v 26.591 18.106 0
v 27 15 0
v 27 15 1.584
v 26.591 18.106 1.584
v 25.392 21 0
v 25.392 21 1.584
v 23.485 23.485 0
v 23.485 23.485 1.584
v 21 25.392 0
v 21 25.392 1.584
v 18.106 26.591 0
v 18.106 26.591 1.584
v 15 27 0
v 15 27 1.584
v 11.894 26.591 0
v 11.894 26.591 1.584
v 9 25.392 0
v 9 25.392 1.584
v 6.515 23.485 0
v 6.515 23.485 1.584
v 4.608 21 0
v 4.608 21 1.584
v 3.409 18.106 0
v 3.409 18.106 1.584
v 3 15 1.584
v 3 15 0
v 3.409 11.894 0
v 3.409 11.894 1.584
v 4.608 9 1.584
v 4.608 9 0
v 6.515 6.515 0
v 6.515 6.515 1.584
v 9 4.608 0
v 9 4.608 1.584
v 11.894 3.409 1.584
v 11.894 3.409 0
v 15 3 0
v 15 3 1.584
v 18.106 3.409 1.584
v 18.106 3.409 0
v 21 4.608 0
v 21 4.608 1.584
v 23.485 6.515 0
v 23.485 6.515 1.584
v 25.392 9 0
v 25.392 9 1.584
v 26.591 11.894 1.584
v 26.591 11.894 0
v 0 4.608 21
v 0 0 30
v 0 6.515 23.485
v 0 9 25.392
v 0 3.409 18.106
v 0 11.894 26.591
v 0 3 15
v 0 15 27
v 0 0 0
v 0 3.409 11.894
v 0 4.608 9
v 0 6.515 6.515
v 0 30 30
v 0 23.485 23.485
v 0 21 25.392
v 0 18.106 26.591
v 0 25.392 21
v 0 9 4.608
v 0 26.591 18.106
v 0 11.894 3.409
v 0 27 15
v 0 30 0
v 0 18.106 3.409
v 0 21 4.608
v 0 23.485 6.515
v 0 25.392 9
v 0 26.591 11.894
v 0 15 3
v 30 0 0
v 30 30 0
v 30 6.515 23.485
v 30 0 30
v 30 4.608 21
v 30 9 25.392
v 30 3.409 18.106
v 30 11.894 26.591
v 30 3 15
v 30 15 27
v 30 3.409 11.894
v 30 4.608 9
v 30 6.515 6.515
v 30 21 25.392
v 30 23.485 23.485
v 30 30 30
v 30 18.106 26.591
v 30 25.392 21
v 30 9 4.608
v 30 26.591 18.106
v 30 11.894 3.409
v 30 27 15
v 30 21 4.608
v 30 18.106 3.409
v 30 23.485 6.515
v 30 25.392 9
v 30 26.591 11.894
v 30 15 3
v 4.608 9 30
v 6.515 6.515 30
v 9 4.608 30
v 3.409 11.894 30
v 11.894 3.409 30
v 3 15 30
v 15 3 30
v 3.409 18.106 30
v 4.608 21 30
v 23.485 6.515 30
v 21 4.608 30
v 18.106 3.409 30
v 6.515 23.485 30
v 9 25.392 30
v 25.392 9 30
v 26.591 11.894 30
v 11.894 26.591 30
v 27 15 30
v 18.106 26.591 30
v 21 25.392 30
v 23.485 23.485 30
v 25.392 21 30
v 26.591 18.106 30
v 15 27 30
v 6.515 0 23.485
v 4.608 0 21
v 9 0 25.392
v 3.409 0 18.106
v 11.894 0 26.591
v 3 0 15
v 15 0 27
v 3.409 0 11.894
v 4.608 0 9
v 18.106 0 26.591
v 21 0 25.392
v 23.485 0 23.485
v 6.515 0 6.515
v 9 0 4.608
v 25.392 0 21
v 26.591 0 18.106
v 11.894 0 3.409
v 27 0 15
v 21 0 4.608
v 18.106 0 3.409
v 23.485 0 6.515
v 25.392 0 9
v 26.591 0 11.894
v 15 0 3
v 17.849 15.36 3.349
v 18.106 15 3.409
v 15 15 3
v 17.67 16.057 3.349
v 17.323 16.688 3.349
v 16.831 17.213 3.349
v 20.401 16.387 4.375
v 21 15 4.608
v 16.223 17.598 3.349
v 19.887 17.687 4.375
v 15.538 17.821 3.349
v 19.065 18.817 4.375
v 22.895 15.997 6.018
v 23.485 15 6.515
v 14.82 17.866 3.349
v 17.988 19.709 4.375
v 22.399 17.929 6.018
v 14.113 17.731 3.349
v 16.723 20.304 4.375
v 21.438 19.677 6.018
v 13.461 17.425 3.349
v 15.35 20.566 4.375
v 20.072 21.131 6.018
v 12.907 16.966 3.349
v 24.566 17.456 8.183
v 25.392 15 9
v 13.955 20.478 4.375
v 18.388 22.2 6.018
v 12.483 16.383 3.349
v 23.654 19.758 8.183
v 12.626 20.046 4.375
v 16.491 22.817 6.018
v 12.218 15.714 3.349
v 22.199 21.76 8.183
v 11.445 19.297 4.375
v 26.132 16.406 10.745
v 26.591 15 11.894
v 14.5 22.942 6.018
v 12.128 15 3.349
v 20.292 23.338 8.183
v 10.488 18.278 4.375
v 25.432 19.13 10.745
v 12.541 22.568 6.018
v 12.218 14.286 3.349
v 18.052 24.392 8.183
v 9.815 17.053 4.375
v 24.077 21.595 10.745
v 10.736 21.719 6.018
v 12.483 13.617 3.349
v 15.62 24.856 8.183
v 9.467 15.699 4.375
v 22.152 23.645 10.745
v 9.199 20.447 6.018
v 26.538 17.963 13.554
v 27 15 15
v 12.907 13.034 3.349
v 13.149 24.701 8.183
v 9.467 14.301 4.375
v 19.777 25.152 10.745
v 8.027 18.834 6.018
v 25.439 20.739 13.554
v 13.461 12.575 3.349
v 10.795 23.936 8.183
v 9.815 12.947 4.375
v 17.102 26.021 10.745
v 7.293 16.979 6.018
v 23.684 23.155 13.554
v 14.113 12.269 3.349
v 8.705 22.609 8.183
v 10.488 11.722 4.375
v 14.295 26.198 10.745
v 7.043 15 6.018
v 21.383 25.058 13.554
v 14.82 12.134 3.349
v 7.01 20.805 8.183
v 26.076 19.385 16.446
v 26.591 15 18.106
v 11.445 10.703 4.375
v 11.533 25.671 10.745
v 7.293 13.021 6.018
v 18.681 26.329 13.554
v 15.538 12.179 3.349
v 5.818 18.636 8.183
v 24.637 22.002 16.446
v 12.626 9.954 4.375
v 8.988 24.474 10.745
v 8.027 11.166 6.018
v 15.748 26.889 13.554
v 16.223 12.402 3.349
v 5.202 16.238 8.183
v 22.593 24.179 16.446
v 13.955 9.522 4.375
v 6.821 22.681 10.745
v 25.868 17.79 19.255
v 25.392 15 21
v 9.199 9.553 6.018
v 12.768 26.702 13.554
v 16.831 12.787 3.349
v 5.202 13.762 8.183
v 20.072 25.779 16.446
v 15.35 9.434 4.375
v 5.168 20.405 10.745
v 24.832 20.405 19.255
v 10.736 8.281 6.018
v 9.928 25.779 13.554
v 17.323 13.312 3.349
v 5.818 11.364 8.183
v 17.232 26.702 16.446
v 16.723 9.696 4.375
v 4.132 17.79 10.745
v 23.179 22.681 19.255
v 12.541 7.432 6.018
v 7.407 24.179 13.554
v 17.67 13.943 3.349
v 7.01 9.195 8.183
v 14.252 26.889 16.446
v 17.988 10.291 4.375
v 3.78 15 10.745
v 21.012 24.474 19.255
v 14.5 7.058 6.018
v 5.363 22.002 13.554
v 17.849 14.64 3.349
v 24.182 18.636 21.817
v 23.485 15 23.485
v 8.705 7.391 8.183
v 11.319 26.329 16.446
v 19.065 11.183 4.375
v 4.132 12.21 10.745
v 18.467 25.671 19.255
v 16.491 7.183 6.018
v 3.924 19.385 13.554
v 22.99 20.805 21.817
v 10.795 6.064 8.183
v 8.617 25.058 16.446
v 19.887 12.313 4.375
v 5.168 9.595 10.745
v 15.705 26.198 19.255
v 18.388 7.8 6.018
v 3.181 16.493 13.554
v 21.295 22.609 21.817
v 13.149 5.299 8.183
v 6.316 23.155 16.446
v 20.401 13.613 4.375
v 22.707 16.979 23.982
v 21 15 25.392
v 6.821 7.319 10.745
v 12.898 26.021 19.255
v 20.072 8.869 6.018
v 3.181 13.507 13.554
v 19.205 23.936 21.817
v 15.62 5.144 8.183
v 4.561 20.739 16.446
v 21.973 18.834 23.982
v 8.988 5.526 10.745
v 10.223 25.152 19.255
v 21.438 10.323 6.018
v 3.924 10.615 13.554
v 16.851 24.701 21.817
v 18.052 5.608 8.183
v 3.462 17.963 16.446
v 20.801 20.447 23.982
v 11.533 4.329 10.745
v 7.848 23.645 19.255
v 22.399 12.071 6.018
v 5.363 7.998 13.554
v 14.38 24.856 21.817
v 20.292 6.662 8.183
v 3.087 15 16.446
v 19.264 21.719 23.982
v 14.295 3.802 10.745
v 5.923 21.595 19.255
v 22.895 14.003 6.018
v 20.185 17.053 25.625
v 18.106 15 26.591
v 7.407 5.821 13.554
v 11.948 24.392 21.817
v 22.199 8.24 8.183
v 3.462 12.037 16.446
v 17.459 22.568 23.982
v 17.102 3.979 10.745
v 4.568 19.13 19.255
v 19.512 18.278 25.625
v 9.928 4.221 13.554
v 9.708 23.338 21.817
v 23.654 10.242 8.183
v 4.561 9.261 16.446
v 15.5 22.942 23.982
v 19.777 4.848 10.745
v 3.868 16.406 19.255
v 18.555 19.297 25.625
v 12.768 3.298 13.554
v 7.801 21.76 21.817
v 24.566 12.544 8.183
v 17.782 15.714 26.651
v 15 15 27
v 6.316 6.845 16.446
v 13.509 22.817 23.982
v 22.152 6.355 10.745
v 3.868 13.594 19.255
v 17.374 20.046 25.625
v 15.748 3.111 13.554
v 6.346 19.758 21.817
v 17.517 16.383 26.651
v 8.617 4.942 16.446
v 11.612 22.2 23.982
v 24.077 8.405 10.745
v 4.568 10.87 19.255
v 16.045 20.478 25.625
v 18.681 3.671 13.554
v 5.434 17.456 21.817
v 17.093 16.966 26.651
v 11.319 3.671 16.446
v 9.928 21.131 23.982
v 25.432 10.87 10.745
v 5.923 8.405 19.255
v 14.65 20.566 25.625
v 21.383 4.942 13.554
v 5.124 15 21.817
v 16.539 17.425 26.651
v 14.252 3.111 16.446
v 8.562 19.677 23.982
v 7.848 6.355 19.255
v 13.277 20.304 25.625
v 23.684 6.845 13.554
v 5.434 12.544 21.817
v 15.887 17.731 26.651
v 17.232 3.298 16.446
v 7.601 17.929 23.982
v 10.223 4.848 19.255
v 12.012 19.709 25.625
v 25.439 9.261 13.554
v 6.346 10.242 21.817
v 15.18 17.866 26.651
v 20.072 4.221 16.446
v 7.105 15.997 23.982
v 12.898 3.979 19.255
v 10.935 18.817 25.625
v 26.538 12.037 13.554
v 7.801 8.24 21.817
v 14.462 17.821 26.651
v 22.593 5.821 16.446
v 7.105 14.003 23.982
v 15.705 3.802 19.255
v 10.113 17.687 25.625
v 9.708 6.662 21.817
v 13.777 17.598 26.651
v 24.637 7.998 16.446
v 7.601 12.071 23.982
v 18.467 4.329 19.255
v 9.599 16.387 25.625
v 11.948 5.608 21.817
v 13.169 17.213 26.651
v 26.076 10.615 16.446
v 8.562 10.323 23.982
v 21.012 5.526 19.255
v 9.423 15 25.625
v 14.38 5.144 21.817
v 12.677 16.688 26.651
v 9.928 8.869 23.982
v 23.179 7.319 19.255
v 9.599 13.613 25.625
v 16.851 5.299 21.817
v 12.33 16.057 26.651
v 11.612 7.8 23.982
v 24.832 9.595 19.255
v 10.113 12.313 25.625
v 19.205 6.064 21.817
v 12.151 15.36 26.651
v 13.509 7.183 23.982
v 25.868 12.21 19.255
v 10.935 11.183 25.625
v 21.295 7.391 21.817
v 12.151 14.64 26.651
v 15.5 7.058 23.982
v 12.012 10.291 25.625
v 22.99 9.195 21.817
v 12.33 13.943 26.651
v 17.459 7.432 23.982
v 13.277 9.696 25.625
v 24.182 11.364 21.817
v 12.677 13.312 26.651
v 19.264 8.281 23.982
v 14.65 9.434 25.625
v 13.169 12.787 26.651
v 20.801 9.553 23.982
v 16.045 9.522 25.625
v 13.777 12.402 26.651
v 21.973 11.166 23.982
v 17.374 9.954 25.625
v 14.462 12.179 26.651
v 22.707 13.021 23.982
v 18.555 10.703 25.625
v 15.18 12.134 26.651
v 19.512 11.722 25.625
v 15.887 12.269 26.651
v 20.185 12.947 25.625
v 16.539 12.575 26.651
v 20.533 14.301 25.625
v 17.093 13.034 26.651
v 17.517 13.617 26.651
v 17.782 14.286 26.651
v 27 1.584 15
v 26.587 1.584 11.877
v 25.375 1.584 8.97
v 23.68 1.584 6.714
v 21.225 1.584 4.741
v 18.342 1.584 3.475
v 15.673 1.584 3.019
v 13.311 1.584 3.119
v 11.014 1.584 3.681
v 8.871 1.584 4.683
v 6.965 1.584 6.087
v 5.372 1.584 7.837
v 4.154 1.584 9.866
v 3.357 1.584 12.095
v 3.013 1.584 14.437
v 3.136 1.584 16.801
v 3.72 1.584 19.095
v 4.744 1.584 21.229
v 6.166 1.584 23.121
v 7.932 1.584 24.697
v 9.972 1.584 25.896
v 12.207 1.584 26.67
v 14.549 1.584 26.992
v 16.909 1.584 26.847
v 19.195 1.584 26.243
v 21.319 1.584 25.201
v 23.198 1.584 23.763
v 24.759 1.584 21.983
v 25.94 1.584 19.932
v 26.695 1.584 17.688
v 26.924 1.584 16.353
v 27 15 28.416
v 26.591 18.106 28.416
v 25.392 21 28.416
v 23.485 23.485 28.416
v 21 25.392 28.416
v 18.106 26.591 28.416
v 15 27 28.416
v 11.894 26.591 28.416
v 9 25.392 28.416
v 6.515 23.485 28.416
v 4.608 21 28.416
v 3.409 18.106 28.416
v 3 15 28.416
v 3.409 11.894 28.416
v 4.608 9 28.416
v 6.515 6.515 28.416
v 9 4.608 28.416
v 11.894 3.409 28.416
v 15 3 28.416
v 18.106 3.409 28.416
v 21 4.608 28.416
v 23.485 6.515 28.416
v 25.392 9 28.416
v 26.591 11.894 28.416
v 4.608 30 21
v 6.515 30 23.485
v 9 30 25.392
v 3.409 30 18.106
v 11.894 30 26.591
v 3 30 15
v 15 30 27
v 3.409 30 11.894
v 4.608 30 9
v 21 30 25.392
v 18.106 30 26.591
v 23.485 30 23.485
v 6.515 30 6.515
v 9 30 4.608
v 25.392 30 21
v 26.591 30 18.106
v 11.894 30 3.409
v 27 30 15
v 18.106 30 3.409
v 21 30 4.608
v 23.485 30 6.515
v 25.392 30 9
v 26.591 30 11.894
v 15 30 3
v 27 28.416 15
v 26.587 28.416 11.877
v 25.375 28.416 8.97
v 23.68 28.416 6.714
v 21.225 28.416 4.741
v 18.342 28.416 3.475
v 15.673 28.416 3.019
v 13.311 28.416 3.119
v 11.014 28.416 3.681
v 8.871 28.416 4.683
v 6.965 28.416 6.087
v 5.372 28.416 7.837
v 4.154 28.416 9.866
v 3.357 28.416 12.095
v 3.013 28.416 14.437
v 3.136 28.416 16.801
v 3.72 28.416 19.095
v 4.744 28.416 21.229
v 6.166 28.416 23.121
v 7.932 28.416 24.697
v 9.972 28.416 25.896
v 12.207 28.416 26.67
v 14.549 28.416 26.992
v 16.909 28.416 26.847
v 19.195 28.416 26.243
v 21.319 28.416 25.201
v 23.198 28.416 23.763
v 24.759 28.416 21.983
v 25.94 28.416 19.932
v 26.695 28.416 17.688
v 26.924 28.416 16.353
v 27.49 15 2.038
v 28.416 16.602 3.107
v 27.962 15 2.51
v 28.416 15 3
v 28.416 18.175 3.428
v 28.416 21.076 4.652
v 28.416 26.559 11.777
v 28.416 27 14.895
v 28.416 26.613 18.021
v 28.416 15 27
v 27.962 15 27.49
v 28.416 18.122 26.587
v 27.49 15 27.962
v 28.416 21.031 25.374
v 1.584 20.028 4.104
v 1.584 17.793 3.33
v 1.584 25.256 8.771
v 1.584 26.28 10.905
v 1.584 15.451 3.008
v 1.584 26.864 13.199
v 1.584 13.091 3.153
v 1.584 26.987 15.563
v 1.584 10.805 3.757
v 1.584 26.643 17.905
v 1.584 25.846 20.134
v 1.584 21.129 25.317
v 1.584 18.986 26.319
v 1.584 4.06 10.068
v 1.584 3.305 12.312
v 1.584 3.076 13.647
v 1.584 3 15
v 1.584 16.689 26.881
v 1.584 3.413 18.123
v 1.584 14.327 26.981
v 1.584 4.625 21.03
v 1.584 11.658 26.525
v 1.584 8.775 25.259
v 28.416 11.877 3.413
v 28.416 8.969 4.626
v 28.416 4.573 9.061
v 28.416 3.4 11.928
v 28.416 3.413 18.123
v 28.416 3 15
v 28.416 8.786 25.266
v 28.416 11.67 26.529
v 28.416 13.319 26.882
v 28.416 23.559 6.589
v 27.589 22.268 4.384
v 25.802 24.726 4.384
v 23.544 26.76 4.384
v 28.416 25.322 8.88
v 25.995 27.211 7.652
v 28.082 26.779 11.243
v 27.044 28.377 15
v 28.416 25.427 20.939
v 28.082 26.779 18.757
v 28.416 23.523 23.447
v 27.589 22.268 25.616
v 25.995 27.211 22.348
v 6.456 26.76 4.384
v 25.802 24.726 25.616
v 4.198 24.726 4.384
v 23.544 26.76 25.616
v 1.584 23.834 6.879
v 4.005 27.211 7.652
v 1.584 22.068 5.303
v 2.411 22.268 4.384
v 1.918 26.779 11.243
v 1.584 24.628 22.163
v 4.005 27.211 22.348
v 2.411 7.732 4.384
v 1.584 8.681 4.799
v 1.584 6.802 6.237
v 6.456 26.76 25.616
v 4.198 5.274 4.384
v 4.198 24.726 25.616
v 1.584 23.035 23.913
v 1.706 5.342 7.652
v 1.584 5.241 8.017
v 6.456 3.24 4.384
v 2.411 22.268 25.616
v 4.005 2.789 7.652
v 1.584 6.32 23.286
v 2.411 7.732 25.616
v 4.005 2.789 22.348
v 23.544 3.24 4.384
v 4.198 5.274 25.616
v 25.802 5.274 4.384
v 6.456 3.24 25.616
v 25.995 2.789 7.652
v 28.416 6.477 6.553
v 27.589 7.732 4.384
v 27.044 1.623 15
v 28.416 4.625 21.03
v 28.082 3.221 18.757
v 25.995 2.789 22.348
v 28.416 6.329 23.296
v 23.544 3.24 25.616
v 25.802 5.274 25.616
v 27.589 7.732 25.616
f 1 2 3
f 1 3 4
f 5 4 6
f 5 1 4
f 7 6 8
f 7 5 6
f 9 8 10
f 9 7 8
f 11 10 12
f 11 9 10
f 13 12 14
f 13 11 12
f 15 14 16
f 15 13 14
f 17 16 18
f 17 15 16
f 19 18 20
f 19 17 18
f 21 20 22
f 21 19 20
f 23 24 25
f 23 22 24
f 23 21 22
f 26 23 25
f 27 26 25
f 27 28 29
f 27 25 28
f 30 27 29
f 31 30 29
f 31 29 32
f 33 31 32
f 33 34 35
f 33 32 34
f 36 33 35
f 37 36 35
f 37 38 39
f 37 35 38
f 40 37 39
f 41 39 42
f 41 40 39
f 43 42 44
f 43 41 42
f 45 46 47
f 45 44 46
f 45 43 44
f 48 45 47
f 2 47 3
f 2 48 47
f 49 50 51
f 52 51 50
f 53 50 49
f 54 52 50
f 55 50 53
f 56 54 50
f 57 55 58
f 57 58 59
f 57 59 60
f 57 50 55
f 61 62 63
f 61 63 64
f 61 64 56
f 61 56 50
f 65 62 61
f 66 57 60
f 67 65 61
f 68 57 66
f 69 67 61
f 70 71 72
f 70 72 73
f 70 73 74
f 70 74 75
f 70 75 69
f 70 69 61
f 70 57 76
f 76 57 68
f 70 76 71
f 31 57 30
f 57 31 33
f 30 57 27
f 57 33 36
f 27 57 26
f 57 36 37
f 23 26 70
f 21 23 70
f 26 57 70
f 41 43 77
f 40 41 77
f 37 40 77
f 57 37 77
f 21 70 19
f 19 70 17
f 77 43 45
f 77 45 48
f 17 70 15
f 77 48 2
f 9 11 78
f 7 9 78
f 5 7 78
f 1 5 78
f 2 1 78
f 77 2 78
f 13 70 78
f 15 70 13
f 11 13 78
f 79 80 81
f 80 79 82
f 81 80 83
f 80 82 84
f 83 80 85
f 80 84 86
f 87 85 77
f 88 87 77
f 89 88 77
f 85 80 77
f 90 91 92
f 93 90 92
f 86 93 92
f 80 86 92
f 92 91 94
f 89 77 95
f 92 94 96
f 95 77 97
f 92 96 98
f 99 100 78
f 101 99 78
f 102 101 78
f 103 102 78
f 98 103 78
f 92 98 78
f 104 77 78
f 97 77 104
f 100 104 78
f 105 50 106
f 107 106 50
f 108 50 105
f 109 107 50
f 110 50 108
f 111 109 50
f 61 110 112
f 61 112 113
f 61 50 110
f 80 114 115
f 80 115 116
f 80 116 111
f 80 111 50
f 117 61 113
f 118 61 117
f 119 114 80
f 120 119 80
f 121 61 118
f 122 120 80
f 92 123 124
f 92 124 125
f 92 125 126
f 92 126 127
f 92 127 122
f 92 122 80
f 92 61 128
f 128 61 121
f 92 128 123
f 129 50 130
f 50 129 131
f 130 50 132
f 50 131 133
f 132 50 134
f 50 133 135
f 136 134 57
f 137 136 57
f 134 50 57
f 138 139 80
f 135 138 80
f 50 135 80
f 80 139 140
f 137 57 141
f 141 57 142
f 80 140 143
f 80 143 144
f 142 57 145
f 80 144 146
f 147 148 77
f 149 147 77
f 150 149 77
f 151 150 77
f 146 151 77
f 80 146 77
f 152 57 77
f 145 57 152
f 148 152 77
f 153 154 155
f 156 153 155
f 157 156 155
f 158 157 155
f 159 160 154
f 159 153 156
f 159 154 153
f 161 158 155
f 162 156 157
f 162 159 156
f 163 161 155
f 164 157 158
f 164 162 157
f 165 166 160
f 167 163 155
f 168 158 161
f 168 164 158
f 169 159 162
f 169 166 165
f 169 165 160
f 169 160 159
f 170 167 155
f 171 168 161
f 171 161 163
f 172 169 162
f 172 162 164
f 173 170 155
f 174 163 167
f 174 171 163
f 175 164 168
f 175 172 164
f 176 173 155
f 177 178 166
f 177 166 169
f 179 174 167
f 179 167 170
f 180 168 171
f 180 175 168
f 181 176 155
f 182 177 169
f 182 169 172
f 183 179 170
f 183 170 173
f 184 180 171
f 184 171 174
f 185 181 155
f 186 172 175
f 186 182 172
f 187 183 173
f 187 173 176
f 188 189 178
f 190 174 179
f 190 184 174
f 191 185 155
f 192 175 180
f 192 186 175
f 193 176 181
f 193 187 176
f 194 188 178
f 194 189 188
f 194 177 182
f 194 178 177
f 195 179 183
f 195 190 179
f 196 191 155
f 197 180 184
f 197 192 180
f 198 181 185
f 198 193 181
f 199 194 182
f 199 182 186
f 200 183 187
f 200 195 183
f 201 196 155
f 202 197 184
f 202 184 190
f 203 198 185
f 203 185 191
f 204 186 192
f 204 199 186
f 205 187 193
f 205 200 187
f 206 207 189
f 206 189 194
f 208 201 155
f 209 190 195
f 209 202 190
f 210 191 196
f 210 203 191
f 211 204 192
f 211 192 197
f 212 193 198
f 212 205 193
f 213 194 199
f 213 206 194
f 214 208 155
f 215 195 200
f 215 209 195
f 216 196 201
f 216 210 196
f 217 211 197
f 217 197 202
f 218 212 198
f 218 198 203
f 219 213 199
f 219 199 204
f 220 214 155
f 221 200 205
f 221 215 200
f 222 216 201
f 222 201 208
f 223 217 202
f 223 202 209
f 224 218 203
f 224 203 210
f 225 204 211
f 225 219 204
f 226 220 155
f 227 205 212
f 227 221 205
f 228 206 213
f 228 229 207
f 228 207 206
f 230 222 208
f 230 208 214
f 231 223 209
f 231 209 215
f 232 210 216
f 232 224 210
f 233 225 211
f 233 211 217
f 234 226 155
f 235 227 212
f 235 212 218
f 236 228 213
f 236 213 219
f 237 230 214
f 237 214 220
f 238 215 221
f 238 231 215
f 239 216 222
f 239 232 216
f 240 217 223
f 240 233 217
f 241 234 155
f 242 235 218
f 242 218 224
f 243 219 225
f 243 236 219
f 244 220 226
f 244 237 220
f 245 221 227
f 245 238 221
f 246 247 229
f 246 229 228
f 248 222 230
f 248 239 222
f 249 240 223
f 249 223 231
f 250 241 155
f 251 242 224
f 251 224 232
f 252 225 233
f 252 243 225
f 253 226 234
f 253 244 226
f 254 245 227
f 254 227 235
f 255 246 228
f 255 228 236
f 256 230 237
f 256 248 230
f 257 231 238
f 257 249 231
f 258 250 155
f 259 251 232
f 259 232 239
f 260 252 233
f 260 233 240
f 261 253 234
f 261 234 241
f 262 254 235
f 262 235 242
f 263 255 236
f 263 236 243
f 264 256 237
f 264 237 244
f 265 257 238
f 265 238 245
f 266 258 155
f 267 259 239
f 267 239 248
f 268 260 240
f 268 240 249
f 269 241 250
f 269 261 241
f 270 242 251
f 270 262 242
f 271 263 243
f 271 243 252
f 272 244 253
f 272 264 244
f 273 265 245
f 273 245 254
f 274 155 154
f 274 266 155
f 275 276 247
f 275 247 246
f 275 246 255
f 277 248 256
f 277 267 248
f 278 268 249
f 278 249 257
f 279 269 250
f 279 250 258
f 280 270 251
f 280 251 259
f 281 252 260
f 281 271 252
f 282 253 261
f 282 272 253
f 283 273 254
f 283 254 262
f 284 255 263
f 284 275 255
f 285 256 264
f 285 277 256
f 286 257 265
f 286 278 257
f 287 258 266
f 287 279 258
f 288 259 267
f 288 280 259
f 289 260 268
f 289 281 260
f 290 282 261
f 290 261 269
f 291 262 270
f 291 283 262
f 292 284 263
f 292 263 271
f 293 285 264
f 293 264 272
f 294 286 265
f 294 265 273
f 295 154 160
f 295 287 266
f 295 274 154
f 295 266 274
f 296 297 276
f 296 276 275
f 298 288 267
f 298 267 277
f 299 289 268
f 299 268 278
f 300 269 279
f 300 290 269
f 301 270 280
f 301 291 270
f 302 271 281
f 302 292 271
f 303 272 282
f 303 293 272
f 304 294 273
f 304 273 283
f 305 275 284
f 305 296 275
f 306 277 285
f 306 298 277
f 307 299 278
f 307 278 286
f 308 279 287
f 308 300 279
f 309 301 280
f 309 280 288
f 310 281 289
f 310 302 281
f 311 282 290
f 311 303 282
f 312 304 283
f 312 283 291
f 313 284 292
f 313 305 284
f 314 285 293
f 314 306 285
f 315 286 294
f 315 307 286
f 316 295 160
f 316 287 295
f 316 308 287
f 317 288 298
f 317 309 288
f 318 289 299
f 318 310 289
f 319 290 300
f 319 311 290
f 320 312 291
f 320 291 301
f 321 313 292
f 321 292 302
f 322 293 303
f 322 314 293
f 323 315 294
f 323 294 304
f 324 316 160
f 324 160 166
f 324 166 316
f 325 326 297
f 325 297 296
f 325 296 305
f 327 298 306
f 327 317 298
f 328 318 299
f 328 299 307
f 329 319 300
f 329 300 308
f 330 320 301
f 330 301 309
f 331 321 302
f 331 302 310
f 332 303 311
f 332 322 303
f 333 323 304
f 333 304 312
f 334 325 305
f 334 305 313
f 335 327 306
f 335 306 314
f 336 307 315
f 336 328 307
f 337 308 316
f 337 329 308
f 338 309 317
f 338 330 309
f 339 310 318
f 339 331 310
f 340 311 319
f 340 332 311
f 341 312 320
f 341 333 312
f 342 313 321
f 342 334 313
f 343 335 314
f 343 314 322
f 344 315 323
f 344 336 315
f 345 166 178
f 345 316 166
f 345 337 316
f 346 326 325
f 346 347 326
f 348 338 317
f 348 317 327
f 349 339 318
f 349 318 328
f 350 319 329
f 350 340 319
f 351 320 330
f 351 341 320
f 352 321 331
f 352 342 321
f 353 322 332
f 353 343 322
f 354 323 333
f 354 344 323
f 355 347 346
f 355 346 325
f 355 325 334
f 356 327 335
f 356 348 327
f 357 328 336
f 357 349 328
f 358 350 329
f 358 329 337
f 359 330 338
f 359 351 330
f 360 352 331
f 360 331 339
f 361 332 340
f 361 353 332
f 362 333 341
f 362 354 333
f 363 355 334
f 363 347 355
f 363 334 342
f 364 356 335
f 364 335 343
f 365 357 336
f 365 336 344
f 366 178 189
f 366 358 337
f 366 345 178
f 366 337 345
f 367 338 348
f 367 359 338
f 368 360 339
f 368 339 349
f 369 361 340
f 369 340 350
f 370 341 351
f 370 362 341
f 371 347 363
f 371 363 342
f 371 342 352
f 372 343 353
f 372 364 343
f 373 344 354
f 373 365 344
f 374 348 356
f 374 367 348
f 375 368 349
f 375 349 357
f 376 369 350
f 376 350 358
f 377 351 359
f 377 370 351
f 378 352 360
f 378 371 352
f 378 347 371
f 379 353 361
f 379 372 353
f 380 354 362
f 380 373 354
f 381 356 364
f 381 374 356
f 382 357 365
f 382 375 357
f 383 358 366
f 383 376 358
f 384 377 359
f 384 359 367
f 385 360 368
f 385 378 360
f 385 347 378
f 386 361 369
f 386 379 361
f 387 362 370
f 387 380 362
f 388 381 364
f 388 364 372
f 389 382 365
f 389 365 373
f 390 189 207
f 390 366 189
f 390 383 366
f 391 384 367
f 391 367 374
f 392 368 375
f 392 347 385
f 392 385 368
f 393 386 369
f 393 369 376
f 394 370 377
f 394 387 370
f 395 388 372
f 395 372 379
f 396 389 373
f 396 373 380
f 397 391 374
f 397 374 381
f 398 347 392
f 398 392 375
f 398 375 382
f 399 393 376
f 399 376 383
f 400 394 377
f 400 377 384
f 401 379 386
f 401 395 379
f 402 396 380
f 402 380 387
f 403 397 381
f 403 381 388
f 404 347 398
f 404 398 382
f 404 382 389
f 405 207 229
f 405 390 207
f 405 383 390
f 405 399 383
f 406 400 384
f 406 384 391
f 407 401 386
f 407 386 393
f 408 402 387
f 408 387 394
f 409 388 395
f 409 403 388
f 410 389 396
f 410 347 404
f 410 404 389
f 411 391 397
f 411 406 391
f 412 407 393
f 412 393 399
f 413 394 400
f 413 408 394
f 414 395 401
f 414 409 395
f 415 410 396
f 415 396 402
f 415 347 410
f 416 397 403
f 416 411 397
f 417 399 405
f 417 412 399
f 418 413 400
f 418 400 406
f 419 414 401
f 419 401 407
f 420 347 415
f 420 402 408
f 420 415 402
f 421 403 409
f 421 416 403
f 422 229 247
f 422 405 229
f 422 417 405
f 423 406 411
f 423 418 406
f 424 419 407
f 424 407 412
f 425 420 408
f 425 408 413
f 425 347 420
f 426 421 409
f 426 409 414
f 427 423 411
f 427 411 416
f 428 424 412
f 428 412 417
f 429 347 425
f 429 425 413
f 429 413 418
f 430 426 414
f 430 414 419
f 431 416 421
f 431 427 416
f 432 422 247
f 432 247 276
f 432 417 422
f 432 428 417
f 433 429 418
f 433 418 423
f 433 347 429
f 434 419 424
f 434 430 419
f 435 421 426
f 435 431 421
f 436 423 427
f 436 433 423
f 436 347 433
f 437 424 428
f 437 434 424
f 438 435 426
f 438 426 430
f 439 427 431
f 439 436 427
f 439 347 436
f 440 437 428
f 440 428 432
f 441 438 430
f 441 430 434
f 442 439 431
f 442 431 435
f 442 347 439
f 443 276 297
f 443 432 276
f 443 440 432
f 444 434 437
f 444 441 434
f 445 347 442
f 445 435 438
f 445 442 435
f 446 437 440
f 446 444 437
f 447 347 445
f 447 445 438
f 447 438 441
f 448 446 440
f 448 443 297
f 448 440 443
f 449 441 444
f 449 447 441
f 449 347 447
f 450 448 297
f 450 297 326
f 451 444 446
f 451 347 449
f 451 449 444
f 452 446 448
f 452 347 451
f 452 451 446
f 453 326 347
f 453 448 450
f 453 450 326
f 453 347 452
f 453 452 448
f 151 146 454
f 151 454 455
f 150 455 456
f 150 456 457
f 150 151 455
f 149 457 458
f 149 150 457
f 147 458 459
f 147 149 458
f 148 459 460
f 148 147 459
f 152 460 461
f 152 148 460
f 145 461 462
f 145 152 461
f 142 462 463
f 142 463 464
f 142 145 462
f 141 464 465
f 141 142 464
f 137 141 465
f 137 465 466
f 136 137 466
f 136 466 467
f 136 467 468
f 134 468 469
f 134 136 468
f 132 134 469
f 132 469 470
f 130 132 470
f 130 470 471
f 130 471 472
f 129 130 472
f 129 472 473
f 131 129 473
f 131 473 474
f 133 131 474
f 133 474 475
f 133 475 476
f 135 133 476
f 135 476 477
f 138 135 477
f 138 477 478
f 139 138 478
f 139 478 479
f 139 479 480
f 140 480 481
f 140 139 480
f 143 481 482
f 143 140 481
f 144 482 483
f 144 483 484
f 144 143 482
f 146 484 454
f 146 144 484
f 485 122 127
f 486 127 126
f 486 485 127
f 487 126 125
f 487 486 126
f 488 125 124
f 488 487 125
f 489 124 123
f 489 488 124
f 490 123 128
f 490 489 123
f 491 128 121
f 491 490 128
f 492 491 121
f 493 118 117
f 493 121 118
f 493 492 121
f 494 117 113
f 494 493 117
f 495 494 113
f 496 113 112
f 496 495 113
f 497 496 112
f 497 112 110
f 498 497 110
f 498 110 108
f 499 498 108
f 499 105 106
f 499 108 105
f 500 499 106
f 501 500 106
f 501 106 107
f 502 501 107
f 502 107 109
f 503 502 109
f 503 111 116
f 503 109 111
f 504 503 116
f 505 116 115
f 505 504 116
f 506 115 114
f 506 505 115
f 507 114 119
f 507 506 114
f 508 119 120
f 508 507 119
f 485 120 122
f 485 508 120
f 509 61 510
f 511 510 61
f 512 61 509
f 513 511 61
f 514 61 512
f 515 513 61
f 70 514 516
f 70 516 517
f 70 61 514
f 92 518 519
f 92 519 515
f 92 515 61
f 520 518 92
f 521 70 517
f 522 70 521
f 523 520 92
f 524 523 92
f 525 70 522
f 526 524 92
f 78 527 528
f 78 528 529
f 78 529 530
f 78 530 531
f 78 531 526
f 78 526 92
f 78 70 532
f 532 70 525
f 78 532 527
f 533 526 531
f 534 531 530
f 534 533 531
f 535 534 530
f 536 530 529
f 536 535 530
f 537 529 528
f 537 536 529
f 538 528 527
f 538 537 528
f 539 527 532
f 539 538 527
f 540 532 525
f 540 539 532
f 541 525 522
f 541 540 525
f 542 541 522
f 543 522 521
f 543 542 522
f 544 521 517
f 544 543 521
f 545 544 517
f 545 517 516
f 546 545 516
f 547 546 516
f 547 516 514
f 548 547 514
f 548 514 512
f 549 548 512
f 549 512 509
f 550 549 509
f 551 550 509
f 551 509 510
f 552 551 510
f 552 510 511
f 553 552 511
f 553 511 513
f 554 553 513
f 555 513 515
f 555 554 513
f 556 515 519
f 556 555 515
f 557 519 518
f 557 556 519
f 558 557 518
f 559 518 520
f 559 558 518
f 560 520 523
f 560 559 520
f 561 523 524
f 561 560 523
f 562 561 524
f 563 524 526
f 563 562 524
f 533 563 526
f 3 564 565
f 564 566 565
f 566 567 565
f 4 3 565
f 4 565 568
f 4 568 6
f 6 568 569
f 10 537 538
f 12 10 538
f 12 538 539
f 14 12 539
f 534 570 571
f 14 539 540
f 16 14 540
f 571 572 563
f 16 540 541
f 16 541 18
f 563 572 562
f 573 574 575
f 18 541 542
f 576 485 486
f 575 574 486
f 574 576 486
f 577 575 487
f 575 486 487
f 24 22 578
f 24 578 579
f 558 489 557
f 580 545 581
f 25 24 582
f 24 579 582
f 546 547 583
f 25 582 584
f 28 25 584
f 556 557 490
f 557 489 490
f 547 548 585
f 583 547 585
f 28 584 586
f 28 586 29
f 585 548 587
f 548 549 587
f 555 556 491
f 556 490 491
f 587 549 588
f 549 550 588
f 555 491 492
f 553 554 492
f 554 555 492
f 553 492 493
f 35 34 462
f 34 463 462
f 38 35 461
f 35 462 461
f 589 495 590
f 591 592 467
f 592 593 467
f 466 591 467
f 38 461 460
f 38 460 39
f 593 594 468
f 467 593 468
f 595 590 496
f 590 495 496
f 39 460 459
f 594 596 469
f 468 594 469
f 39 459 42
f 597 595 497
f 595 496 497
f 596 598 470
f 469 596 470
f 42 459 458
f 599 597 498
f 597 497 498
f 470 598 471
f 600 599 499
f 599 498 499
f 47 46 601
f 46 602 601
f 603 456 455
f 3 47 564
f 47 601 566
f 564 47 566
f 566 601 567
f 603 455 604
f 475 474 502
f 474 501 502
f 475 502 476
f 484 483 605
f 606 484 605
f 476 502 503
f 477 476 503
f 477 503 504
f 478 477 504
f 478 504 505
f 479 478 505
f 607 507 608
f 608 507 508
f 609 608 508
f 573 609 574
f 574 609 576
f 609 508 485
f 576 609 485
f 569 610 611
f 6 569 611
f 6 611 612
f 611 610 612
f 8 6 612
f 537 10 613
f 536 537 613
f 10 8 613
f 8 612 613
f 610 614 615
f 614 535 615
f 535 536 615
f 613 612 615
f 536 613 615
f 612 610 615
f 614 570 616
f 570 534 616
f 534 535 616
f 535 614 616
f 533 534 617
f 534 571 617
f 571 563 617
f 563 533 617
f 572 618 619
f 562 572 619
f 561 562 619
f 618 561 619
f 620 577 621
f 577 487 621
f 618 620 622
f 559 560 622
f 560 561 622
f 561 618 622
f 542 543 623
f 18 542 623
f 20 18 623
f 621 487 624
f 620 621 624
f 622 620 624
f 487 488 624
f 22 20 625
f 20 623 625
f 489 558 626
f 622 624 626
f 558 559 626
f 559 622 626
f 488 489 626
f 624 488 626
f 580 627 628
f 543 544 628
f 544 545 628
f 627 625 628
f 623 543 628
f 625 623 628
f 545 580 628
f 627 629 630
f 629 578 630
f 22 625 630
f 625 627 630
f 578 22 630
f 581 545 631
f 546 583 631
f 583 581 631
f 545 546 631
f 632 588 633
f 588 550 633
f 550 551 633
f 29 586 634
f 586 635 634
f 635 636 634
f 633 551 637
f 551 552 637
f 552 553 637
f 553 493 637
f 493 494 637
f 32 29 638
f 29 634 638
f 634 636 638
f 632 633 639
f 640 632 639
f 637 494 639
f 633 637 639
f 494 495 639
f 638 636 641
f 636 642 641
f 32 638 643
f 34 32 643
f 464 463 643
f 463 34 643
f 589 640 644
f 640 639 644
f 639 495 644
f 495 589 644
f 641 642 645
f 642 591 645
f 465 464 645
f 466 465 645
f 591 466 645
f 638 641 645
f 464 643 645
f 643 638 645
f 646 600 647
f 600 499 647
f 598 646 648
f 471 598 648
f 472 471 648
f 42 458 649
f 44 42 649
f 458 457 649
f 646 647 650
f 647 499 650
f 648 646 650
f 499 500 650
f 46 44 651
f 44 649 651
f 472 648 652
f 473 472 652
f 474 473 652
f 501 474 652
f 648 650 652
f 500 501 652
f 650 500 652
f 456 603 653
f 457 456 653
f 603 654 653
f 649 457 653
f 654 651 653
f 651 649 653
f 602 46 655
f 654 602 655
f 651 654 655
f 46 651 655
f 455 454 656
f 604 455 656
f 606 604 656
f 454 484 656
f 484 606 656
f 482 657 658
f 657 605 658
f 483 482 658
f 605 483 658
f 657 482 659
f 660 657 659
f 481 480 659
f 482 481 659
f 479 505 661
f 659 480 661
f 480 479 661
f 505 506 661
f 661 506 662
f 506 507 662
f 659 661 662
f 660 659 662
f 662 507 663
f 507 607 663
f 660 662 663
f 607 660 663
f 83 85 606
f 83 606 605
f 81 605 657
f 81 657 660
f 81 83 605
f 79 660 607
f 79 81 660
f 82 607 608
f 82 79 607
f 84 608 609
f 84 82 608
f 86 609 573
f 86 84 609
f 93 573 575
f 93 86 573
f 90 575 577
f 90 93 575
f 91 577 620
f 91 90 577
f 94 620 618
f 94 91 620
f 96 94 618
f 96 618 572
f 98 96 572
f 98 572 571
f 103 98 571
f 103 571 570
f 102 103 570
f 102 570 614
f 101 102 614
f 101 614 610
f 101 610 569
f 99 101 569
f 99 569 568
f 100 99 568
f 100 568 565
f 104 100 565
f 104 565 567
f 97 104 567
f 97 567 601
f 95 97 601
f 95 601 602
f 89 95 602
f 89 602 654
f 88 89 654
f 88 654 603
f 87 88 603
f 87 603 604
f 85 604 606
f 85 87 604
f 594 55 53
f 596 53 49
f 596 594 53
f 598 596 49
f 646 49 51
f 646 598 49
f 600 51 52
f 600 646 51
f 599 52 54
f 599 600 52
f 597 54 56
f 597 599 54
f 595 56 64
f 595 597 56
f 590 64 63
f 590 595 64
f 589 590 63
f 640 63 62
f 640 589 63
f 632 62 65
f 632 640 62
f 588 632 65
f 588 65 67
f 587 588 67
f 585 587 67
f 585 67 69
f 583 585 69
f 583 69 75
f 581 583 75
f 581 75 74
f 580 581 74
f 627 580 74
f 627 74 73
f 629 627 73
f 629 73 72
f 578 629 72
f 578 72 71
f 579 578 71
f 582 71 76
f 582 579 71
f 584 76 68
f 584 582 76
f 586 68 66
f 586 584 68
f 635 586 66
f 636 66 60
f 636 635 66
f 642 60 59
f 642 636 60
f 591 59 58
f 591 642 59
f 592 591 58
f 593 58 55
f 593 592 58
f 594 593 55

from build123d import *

# Parameters (mm, degrees)
CYLINDER002_R     = 12
CYLINDER002_DEPTH = 35
CYLINDER003_R     = 12
CYLINDER003_DEPTH = 35
CYLINDER001_R     = 12
CYLINDER001_DEPTH = 35
BOX_W             = 30
BOX_H             = 30
BOX_DEPTH         = 30


with BuildPart() as esfera:
    # Sphere → Sphere (revolve)
    with BuildSketch(Plane(origin=(15, 15, 15), x_dir=(1, 0, 0), z_dir=(0, -1, 0))):
        with BuildLine():
            ThreePointArc((0, -12), (12, 0), (0, 12))
            Line((0, 12), (0, -12))
        make_face()
    revolve(axis=Axis((15, 15, 15), (0, 0, 1)))


with BuildPart() as esfera001:
    # Sphere001 → Sphere001 (revolve)
    with BuildSketch(Plane(origin=(15, 15, 15), x_dir=(1, 0, 0), z_dir=(0, -1, 0))):
        with BuildLine():
            ThreePointArc((0, -18), (18, 0), (0, 18))
            Line((0, 18), (0, -18))
        make_face()
    revolve(axis=Axis((15, 15, 15), (0, 0, 1)))


with BuildPart() as cilindre002:
    # Cylinder002 → Cylinder002 (new body)
    with BuildSketch(Plane(origin=(15, 15, -2.5), x_dir=(1, 0, 0), z_dir=(0, 0, 1))):
        Circle(CYLINDER002_R)
    extrude(amount=CYLINDER002_DEPTH)


with BuildPart() as cilindre003:
    # Cylinder003 → Cylinder003 (new body)
    with BuildSketch(Plane(origin=(32.5, 15, 15), x_dir=(0, -1, 0), z_dir=(-1, 0, 0))):
        Circle(CYLINDER003_R)
    extrude(amount=CYLINDER003_DEPTH)


with BuildPart() as fusion:
    # Cylinder001 → Cylinder001 (new body)
    with BuildSketch(Plane(origin=(15, -2.5, 15), x_dir=(1, 0, 0), z_dir=(0, 1, 0))):
        Circle(CYLINDER001_R)
    extrude(amount=CYLINDER001_DEPTH)

    # Fusion: union Cilindre002, Cilindre003
    add(cilindre002.part)
    add(cilindre003.part)


with BuildPart() as cut001:
    # Box → Box (new body)
    with BuildSketch(Plane.XY):
        with Locations((15, 15)):
            Rectangle(BOX_W, BOX_H)
    extrude(amount=BOX_DEPTH)

    # Cut: cut Fusion
    add(fusion.part, mode=Mode.SUBTRACT)

    # Cut001: cut Esfera001
    add(esfera001.part, mode=Mode.SUBTRACT)


solid = Compound([esfera.part, cut001.part])
